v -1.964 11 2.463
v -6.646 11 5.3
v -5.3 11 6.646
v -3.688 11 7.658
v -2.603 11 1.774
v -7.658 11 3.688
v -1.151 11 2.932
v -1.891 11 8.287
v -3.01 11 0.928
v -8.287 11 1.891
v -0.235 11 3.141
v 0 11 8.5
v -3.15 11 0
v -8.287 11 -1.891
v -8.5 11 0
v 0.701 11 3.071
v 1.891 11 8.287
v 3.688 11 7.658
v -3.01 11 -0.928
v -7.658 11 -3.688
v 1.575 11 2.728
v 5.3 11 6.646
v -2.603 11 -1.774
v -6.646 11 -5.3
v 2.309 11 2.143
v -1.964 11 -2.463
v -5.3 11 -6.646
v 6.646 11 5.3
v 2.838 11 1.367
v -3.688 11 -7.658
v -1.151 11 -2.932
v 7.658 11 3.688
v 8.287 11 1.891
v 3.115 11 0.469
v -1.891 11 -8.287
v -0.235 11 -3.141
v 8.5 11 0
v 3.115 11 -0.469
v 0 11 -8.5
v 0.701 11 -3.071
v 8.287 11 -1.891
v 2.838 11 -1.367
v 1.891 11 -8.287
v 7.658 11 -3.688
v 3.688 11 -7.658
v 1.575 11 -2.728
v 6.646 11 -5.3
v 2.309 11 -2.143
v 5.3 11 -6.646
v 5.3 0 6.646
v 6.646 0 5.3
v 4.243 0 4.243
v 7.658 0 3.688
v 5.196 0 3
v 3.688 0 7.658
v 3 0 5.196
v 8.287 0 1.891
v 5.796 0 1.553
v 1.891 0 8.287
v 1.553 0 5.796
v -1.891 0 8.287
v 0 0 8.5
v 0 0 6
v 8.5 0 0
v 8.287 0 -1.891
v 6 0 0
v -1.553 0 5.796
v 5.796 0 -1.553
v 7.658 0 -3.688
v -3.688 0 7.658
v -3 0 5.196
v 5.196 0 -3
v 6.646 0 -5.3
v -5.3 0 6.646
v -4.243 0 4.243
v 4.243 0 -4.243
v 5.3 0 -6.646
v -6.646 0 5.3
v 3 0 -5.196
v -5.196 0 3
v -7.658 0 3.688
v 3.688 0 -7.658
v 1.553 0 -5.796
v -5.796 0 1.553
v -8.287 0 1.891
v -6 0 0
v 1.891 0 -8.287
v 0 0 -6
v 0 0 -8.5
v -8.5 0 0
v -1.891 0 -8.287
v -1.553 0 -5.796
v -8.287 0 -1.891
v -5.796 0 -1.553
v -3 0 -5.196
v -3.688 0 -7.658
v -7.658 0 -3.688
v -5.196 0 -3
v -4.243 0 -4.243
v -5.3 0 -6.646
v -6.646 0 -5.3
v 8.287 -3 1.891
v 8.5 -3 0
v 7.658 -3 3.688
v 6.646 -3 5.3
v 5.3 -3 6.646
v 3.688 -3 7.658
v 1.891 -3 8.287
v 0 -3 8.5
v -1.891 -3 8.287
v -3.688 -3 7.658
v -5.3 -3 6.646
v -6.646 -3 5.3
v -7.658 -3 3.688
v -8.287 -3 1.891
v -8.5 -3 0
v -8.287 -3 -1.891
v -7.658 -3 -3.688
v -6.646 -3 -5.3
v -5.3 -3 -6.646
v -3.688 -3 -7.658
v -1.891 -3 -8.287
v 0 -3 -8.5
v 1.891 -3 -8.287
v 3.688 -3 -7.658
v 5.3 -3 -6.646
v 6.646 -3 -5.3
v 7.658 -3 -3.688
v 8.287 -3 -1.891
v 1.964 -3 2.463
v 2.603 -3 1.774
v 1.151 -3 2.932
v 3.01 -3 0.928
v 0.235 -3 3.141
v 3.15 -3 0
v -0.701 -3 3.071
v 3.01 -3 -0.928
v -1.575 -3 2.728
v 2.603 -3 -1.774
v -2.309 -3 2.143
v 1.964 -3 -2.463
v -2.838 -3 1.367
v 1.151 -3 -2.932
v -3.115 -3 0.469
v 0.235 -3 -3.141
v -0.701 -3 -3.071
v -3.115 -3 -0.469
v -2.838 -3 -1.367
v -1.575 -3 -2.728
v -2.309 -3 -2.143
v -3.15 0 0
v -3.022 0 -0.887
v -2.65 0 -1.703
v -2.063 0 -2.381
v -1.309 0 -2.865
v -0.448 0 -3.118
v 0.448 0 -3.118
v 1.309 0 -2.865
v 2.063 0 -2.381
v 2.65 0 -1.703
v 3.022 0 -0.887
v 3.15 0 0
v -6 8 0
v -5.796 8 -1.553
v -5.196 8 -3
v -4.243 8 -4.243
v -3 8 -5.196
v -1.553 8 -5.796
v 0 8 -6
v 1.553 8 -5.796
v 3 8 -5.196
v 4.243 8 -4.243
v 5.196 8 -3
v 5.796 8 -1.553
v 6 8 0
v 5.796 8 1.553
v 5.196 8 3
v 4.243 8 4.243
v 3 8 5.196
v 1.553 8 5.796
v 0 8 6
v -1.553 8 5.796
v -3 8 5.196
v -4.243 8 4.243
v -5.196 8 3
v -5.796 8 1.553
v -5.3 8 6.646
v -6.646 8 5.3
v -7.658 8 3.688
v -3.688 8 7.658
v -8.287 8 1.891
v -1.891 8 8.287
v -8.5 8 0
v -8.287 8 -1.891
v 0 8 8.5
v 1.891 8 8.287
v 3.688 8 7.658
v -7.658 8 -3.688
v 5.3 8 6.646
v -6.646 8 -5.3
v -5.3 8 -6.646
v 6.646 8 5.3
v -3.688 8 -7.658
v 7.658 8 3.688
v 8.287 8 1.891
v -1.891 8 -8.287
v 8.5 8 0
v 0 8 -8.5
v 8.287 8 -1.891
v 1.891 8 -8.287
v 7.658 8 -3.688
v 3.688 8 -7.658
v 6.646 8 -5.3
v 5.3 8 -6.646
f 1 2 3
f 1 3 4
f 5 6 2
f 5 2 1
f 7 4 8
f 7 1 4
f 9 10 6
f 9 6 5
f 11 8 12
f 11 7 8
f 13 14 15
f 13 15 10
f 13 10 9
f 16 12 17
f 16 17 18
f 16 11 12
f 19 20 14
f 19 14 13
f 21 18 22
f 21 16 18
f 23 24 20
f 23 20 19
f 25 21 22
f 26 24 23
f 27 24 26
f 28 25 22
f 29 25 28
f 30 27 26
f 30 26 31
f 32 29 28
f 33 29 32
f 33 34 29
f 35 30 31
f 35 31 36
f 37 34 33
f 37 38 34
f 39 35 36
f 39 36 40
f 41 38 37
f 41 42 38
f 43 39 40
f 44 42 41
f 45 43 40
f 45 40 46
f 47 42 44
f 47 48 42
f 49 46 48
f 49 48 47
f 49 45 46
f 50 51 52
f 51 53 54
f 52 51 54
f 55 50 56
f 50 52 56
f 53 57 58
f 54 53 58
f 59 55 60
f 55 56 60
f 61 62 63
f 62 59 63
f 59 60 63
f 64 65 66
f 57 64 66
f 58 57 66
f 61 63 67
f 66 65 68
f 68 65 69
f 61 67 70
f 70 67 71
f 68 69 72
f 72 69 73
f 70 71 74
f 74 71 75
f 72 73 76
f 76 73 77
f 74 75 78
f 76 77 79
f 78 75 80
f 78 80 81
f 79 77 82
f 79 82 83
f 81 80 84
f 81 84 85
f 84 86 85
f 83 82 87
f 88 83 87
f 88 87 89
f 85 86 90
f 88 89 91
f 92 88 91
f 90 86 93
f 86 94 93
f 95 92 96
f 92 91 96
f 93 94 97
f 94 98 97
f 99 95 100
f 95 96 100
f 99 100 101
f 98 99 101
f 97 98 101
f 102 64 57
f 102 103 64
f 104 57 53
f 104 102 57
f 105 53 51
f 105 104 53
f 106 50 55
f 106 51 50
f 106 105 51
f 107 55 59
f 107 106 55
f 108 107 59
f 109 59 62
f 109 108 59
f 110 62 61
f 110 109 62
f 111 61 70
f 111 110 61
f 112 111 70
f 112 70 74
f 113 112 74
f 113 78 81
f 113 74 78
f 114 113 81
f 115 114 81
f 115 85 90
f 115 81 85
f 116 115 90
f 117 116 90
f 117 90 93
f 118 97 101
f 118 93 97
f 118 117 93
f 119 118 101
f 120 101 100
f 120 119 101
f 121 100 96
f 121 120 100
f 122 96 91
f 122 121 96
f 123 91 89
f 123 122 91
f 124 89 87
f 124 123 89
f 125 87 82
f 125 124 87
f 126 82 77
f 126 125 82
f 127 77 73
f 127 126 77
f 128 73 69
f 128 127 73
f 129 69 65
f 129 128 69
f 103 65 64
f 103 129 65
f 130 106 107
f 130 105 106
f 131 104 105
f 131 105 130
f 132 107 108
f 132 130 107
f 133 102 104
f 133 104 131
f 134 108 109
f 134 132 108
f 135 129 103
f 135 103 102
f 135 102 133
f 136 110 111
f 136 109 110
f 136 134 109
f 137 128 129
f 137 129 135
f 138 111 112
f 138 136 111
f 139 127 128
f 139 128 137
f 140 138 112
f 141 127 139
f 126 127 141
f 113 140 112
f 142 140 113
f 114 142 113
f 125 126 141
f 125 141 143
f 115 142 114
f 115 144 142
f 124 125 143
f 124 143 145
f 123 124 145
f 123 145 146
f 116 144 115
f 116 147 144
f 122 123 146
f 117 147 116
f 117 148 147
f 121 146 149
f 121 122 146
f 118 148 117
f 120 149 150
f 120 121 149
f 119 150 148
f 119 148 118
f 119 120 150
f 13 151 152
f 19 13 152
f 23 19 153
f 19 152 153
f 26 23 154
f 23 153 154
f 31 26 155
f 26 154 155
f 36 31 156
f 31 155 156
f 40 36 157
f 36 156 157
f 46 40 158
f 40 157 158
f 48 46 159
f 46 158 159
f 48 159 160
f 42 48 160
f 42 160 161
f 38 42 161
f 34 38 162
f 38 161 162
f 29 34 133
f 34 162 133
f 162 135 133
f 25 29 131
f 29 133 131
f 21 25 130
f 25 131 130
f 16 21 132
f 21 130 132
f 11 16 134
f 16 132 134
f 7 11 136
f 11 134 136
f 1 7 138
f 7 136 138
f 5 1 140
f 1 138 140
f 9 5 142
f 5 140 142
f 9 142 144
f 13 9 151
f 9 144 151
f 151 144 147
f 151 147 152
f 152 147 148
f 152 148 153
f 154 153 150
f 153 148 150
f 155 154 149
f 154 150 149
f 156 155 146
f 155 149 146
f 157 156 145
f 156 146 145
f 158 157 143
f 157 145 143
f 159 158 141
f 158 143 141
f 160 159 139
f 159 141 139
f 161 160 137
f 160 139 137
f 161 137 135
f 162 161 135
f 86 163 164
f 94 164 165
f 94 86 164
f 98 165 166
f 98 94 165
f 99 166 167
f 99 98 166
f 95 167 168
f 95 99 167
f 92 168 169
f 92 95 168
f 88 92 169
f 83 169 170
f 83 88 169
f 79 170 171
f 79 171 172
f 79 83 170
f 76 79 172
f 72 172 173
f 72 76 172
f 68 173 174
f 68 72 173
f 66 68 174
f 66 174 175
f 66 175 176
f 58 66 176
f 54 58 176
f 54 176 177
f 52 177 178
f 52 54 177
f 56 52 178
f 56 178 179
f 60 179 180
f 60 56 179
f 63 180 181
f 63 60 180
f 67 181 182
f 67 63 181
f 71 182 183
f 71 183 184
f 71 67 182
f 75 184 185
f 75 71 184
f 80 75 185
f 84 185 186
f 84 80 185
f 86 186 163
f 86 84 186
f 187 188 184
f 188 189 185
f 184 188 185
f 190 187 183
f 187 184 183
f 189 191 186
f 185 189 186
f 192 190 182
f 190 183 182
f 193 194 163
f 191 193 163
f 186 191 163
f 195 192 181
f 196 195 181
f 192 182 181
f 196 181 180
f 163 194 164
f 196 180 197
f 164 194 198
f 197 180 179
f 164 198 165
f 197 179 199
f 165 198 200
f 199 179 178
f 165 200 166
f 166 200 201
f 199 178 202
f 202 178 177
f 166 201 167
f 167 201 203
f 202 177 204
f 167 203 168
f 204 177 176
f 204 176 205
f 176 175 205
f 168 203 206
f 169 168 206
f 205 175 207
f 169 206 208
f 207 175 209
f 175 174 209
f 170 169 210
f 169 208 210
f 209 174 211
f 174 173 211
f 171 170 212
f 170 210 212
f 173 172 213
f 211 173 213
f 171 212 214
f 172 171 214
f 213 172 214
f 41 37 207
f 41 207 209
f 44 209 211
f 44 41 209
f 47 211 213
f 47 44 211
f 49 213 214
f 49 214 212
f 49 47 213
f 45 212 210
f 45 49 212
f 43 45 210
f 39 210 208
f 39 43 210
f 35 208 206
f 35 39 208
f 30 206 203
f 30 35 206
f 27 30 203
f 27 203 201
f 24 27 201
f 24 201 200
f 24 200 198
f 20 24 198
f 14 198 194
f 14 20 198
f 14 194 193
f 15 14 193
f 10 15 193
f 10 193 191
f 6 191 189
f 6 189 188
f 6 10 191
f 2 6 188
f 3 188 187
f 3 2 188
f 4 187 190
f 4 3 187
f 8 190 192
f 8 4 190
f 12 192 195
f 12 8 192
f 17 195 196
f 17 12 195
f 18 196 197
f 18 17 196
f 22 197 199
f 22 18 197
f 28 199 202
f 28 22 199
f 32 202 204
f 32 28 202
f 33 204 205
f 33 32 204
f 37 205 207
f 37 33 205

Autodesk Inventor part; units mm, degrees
ref_plane "YZ Plane" through (0, 0, 0) normal (1, 0, 0) x (0, 1, 0)
ref_plane "XZ Plane" through (0, 0, 0) normal (0, 1, 0) x (-1, 0, 0)
ref_plane "XY Plane" through (0, 0, 0) normal (0, 0, 1) x (1, 0, 0)
sketch "Sketch1" plane through (0, 0, 0) normal (0, 1, 0) x (-1, 0, 0)
  circle A0 centre (0, 0) radius 3.15
  circle A1 centre (0, 0) radius 6
  dimension "d0" = 6.3
  dimension "d2" = 12
extrude "Extrusion1" add sketch "Sketch1" along normal blind 11
sketch "Sketch2" plane through (0, 11, 0) normal (0, 1, 0) x (1, 0, 0)
  circle A0 centre (0, 0) radius 2.6288
  circle A1 centre (0, 0) radius 3.15 projected
  circle A2 centre (0, 0) radius 8.5
  dimension "d5" = 17
extrude "Extrusion2" add sketch "Sketch2" against normal blind 3 contours A2
ref_plane "Work Plane1" through (0, 4, 0) normal (0, -1, 0) x (1, 0, 0)
mirror "Mirror1" about plane through (0, 4, 0) normal (0, -1, 0) of "Extrusion2"
ref_plane "Work Plane2" through (0, 4, 0) normal (0, -1, 0) x (1, 0, 0)
properties part number "Belt tensor V2"
